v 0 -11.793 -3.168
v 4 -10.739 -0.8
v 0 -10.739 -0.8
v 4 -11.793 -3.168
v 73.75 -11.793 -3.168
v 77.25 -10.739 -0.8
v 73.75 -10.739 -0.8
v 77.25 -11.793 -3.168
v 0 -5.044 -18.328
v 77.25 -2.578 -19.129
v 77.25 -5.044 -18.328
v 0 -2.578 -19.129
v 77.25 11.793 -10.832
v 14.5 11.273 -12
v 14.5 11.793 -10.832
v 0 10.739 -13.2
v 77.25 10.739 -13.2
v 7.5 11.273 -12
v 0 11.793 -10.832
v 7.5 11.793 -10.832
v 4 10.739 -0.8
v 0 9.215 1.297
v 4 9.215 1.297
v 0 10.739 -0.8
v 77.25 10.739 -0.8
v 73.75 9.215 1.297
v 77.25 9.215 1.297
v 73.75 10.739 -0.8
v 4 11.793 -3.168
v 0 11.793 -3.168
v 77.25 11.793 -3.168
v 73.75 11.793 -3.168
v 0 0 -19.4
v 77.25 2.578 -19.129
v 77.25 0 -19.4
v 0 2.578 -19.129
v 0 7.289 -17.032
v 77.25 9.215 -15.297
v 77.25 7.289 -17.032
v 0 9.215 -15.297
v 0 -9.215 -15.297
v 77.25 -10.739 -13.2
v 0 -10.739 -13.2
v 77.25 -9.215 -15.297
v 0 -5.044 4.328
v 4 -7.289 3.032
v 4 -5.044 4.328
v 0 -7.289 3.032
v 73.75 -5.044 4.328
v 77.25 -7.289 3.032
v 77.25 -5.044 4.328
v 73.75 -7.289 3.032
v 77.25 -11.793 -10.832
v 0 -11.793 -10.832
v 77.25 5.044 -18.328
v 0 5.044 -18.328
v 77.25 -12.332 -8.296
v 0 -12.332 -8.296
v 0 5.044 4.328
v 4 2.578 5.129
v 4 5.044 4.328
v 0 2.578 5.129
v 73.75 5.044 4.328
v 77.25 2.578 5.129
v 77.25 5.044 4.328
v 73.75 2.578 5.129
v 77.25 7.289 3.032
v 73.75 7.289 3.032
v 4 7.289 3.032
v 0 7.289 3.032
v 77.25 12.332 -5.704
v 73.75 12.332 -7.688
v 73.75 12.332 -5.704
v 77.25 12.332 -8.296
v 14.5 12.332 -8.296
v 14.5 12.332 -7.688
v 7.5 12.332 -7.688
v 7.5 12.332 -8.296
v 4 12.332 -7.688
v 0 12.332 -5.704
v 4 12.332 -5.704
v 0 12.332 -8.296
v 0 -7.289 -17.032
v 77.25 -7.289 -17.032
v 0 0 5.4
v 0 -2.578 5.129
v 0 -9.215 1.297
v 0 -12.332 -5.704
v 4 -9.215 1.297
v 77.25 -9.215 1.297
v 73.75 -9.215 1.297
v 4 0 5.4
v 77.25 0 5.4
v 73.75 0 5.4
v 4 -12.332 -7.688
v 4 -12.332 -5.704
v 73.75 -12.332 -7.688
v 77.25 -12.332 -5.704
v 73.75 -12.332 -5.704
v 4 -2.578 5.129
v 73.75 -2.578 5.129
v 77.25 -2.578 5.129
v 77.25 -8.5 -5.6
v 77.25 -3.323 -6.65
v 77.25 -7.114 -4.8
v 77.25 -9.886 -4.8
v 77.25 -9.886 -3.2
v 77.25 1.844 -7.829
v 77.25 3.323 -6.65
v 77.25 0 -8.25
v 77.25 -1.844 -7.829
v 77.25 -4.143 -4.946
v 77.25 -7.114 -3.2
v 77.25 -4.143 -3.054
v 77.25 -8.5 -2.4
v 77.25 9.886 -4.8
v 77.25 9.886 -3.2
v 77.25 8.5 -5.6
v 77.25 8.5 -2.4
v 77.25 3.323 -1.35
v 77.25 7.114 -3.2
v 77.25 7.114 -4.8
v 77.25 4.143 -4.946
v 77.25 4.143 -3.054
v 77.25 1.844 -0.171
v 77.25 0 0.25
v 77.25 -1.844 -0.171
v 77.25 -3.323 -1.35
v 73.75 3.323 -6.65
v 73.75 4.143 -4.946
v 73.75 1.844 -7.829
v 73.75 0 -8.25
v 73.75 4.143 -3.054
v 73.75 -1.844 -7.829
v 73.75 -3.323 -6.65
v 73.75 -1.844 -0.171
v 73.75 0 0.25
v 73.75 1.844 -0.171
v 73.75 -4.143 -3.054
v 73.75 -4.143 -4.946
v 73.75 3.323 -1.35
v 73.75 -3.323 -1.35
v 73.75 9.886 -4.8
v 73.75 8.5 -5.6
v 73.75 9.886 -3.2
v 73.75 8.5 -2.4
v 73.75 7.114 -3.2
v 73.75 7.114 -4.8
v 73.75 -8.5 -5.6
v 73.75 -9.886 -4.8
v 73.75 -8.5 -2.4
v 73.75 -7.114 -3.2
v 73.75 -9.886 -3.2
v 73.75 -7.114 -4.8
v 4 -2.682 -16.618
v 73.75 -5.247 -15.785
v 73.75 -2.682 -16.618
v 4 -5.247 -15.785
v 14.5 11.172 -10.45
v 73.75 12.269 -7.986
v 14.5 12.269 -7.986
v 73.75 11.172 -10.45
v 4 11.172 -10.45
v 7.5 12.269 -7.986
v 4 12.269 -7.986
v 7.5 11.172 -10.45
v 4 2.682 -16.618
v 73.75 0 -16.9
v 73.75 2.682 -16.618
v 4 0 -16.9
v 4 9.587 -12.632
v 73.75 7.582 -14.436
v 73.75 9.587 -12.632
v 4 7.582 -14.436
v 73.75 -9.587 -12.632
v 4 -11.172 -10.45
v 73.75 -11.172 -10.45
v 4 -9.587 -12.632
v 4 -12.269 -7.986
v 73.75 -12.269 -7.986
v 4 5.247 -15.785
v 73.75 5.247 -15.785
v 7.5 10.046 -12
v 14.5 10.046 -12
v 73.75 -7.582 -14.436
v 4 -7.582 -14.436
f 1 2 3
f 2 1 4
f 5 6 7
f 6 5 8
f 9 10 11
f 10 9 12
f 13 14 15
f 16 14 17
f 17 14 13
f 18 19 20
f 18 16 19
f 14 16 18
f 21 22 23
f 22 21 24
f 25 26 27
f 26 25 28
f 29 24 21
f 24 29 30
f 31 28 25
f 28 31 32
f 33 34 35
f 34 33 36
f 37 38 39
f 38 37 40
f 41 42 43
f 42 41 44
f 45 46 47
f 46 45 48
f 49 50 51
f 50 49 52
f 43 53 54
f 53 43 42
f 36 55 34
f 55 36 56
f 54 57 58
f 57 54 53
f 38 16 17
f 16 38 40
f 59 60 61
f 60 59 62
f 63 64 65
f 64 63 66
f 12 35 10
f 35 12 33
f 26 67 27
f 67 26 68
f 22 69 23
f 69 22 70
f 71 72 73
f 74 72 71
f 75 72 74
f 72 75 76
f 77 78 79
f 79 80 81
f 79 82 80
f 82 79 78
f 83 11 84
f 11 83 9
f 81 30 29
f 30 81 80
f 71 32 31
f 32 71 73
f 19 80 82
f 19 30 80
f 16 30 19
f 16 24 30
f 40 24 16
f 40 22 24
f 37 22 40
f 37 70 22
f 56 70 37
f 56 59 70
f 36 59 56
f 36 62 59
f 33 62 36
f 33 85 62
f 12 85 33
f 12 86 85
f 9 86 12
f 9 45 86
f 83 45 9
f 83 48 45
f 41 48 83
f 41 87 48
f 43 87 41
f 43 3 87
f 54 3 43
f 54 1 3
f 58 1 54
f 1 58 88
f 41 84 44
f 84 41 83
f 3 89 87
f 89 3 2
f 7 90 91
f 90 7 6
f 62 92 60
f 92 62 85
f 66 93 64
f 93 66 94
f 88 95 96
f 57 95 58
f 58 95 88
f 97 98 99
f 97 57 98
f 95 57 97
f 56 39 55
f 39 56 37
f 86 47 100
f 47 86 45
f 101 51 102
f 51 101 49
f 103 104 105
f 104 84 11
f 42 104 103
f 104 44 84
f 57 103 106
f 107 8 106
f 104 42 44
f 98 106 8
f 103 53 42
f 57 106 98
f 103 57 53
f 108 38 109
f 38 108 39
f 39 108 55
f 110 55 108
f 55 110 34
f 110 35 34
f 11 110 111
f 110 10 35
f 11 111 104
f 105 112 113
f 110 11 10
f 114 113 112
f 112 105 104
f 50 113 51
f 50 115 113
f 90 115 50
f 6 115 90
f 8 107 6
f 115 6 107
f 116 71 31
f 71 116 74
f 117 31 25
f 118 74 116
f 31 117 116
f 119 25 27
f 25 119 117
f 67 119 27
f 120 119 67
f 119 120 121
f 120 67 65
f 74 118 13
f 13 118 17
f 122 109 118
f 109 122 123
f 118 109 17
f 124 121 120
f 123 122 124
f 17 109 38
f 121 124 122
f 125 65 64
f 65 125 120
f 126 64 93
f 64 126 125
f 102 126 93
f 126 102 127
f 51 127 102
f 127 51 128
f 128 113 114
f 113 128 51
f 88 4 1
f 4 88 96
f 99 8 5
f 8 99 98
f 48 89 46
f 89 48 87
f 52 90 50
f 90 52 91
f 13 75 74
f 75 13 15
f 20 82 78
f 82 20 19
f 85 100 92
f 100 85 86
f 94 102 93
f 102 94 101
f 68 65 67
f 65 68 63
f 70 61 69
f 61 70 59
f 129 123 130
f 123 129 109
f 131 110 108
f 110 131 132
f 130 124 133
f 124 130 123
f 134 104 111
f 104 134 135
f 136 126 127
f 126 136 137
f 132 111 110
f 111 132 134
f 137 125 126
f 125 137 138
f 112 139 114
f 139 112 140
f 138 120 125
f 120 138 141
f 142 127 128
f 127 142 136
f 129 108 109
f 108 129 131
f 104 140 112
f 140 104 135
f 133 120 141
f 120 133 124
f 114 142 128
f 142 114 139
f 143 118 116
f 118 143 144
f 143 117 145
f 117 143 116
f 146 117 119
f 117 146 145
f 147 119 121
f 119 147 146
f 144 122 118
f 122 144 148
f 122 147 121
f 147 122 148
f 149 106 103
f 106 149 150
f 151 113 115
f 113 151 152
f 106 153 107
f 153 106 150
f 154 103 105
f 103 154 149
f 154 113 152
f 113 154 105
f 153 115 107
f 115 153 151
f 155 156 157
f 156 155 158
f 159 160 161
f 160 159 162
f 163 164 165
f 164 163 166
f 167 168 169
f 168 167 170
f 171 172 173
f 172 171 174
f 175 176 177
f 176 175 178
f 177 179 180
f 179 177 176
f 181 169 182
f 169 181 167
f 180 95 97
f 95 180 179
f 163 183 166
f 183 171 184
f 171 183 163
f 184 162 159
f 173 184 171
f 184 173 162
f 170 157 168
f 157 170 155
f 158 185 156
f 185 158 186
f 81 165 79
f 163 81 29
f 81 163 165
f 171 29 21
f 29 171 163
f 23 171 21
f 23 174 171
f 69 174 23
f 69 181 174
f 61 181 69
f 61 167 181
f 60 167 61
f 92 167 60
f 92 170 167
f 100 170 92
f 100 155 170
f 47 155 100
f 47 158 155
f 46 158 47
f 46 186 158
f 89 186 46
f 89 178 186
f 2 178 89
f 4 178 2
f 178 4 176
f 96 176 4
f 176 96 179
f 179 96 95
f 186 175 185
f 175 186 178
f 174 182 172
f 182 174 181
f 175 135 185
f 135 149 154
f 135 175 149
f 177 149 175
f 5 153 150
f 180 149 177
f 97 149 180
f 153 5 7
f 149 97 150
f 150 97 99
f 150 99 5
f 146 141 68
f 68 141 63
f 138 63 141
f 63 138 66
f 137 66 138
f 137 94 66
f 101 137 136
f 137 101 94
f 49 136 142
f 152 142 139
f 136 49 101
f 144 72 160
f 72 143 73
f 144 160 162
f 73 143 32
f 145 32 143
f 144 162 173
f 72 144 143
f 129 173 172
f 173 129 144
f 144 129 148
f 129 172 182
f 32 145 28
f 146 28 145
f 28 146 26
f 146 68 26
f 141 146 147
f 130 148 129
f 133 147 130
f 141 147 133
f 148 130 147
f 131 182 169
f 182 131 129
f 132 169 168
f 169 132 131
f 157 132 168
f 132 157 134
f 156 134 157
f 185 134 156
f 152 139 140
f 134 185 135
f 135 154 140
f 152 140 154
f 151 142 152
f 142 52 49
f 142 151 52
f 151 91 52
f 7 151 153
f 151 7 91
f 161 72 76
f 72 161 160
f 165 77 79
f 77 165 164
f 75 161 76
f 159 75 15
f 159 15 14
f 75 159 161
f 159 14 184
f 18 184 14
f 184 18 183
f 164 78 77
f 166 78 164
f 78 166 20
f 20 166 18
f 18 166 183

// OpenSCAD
// file: ../robot_settings.scad
main_box_x = 100; // 96
main_box_y = 102;
main_box_z = 74; // 74.5

lfp_main_box_x = 66;
lfp_main_box_y = 152;
lfp_main_box_z = 93;

wall_thickness = 5;

rail_gap = 2;
rail_inset = 7;

rail_thickness = 7;
rail_length = 250;
 rail_width = 260;

lfp_battery_width = 65.5;
lfp_battery_depth = 150.5;
lfp_battery_height = 93;
lfp_battery_midterrace_width = 64.8;
lfp_battery_midterrace_depth = 150.2;
lfp_battery_midterrace_height = 7.8;
lfp_battery_topterrace_width = 62.8;
lfp_battery_topterrace_depth = 149.4;
lfp_battery_topterrace_height = 6.6;

// red right
// black left
lfp_battery_terminal_width = 9.2;
lfp_battery_terminal_depth = 9.5;
lfp_battery_terminal_depth_setback = 4.4;
lfp_battery_terminal_width_setback = 5.9;

raspberry_pi_screw_seperation_y = 57;
raspberry_pi_screw_seperation_z = 48;
raspberry_pi_peg_h = 5;

battery_box_peg_h = 6;
battery_box_peg_d = 9.5;
battery_box_peg_cutout = 5;

gears_module = 1;
pinion_gear_teeth = 32;
pinion_gear_width = 5;
pinion_gear_bore = 8;

gears_setback_distance = 25;
gear_post_height = 2 * pinion_gear_width + rail_thickness + 8 ;

steering_motor_mount_x = 45;
steering_motor_mount_y = 36;
steering_motor_mount_z = 18;
steering_motor_mount_setback_distance = gears_setback_distance + 16;

dc_motor_drivertype = "Teyleten"; // Teyleten
isAdafruit = (dc_motor_drivertype == "Adafruit");

drv8871_x = isAdafruit ? 20.3 : 21.6;
drv8871_y = isAdafruit ?  24 : 25;

drv8871_z = 2;
drv8871_screw_d = 2.5;
drv8871_solder_points_z = 2;

drv8871mount_edge_x = 1.5;
drv8871mount_edge_wall = 3;
drv8871mount_z = 5;
drv8871mount_x = drv8871_x +  drv8871mount_edge_wall - 2* drv8871mount_edge_x;
drv8871mount_y = 19;

drv8871_screw_distance = 15.64;
drv8871_solder_points_d = 1.66;
drv8871_solder_offset_y = 4.4;
drv8871_solder_inner_points_distance = 5;
drv8871_solder_outer_points_distance = 12;

dc_motor_75_1_encoder_z = 14.75;
dc_motor_75_1_encoder_d = 24.5;
dc_motor_75_1_housing_z = 30;
dc_motor_75_1_housing_d = 24.1;
dc_motor_75_1_gearbox_z = 23;
dc_motor_75_1_gearbox_d = 24.8;
dc_motor_75_1_z = dc_motor_75_1_encoder_z + dc_motor_75_1_housing_z + dc_motor_75_1_gearbox_z;

dc_motor_housing_minus_encoder_z = 48;
dc_motor_encoder_z = 9.33;
dc_motor_encoder_wheel_d = 13.4;
dc_motor_encoder_wheel_thickness = 5;
dc_motor_encoder_wheel_gap = 3;
dc_motor_encoder_circuit_thickness = 2;
dc_motor_z = dc_motor_housing_minus_encoder_z + dc_motor_encoder_z + dc_motor_encoder_wheel_thickness + dc_motor_encoder_wheel_gap + dc_motor_encoder_circuit_thickness;
dc_motor_cutout_d = 24.8;
dc_motor_cutout_z = 19.5;


M3_shaft_d = 2.82;

dc_motor_screw_head_z = 2;
dc_motor_screw_head_d = 5.6;
dc_motor_screw_d = 3.2;
dc_motor_screw_offset = 8.5;

dc_motor_axle_ring_z = 3;
dc_motor_axle_ring_d = 7.2;
dc_motor_axle_cutout_d = 4.2;
dc_motor_axle_cutout_z = 10;
dc_motor_axle_notch_cutout = 0.4;
dc_motor_axle_notch_cutout_z = 6;

pdmount_x = 20;
pdmount_y = 30;
pdmount_z = 2;
pdmount_edge_x = 1.5;
pdmount_edge_wall = 3;

steering_shaft_z = 45;
steering_shaft_d = 7;
steering_shaft_motor_fitting_d = 9;
coupler_length = 24.6;
coupler_diameter = 14;
coupler_screw_d = 4;
coupler_screw_z_offset = 5;
coupler_gear_side_insert = 12.6;
steering_shaft_with_coupler_z = steering_shaft_z - coupler_gear_side_insert;

lidar_mount_y = 110;
lidar_mount_x = 65 + 20;
lidar_narrow_screws = 40;
lidar_wide_screws = 56;
lidar_front_to_back_screws = 70;
lidar_screw_d = 3;
lidar_circuitboard_x = 20;
lidar_circuitboard_y = 35;
lidar_circuitboard_z = 1.2;
lidar_cord_length = 29;

ball_bearing_height = 7;
ball_bearing_outer_diameter = 22;
ball_bearing_inner_diameter = 8;

M4_diameter = 5.1;
M3_diameter = 2.9;
M3_length = 35;
M3_cap_length= 3;
M3_cap_diameter = 5.44;

suspension_spring_outer_diameter = 8;
suspension_spring_inner_diameter = 5.3;

armature_holder_height = 20;
armature_holder_thickness = 8;
pull_bar_peg_r = 3.2;
apparatus_locking_peg_d = 4;

rack_module = 1;
rack_length = main_box_x;
rack_height = 5;
rack_width = 10;
rack_teeth = 30;
rack_bore = 3;

pull_bar_length = rail_width / 2 - rack_length + 1;

// tire hardware
axle_length = 24 + ball_bearing_height; 
axle_reciever_inner_diameter = 8.2;
axle_reciever_outer_diameter = 12;
axle_reciever_length = 18.8;
axle_notch_length = 15;
axle_notch_cutout = 2.4;

// power distribution bar
power_bar_cutout_x = 96;
power_bar_y = 19.1;
power_bar_z = 1.5;
power_bar_screw_distance = 91.4;
power_bar_screw_d = 2.8;
power_bar_standoff_z = 5;
power_bar_standoff_d = 6.83;

pico_expander_width = 63;
pico_expander_height = 57;
pico_screw_hole_offset = 3;
pico_screw_hole_d = 2.5;

usbhub_thickness = 11.7;
usbhub_depth = 37.5;
usbhub_width = 86.7;
usbhub_end_port_width = 14.8;
usbhub_end_port_height = 12;
usbhub_front_face_safe_zone_left = 15;
usbhub_front_face_safe_zone_right = 14.8;

switch_w = 16;
switch_cutout_d = 12.2;
switch_bump_h = 2;
switch_bump_l = 18.2;

i2c_mount_thickness = 3;
i2c_w = 28;
i2c_l = 28;
i2c_circuitboard_thickness = 1.23;
i2c_bottom_notch_w = 14.35;
i2c_bottom_notch_depth = 1;
i2c_screw_hole_d = 1.9;
i2c_screw_hole_offset = 1.4;
i2c_pin_l = 11;
i2c_pin_d = 0.8;
i2c_pin_offset = 1.5;
i2c_pin_separation = 2.5;
i2c_all_pins_l = 8.3;
i2c_screen_thickness = 1.88;
i2c_screen_w = 14.6;
i2c_screen_d = 27;
i2c_screen_offset = 4.1;
// main file
include <../robot_settings.scad>

module steering_motor_holder(end_cap_offset = dc_motor_75_1_z) {
        translate([0, 0, 0]) {
            //difference() {
                color("red")
                difference() {
                  translate([0, 0, -7])
                  rotate([0, 90, 0])
                  cylinder(h =  end_cap_offset + 9.5, d = dc_motor_cutout_d);
          
                 // axle hole
                translate([end_cap_offset, 0, -4])
                  rotate([0, 90, 0])
                  cylinder(h = 20, d = dc_motor_screw_offset);
                 
                 // screw hole
                translate([end_cap_offset, dc_motor_screw_offset, -4])
                 rotate([0, 90, 0])
                 cylinder(h = 20, d = dc_motor_screw_d);
                 
                 // screw hole
                translate([end_cap_offset, -dc_motor_screw_offset, -4])
                 rotate([0, 90, 0])
                 cylinder(h = 20, d = dc_motor_screw_d);
   
                color("green") 
                translate([4, 0, -4])
                rotate([0, 90, 0])
                cylinder(h = end_cap_offset + 2, d = dc_motor_cutout_d + 1);   

                // curcuit board connector cutout
                translate([7.5, 10, -12])
                cube([7, 3,  5]);
          }
      }

              //}
    }
    steering_motor_holder();
